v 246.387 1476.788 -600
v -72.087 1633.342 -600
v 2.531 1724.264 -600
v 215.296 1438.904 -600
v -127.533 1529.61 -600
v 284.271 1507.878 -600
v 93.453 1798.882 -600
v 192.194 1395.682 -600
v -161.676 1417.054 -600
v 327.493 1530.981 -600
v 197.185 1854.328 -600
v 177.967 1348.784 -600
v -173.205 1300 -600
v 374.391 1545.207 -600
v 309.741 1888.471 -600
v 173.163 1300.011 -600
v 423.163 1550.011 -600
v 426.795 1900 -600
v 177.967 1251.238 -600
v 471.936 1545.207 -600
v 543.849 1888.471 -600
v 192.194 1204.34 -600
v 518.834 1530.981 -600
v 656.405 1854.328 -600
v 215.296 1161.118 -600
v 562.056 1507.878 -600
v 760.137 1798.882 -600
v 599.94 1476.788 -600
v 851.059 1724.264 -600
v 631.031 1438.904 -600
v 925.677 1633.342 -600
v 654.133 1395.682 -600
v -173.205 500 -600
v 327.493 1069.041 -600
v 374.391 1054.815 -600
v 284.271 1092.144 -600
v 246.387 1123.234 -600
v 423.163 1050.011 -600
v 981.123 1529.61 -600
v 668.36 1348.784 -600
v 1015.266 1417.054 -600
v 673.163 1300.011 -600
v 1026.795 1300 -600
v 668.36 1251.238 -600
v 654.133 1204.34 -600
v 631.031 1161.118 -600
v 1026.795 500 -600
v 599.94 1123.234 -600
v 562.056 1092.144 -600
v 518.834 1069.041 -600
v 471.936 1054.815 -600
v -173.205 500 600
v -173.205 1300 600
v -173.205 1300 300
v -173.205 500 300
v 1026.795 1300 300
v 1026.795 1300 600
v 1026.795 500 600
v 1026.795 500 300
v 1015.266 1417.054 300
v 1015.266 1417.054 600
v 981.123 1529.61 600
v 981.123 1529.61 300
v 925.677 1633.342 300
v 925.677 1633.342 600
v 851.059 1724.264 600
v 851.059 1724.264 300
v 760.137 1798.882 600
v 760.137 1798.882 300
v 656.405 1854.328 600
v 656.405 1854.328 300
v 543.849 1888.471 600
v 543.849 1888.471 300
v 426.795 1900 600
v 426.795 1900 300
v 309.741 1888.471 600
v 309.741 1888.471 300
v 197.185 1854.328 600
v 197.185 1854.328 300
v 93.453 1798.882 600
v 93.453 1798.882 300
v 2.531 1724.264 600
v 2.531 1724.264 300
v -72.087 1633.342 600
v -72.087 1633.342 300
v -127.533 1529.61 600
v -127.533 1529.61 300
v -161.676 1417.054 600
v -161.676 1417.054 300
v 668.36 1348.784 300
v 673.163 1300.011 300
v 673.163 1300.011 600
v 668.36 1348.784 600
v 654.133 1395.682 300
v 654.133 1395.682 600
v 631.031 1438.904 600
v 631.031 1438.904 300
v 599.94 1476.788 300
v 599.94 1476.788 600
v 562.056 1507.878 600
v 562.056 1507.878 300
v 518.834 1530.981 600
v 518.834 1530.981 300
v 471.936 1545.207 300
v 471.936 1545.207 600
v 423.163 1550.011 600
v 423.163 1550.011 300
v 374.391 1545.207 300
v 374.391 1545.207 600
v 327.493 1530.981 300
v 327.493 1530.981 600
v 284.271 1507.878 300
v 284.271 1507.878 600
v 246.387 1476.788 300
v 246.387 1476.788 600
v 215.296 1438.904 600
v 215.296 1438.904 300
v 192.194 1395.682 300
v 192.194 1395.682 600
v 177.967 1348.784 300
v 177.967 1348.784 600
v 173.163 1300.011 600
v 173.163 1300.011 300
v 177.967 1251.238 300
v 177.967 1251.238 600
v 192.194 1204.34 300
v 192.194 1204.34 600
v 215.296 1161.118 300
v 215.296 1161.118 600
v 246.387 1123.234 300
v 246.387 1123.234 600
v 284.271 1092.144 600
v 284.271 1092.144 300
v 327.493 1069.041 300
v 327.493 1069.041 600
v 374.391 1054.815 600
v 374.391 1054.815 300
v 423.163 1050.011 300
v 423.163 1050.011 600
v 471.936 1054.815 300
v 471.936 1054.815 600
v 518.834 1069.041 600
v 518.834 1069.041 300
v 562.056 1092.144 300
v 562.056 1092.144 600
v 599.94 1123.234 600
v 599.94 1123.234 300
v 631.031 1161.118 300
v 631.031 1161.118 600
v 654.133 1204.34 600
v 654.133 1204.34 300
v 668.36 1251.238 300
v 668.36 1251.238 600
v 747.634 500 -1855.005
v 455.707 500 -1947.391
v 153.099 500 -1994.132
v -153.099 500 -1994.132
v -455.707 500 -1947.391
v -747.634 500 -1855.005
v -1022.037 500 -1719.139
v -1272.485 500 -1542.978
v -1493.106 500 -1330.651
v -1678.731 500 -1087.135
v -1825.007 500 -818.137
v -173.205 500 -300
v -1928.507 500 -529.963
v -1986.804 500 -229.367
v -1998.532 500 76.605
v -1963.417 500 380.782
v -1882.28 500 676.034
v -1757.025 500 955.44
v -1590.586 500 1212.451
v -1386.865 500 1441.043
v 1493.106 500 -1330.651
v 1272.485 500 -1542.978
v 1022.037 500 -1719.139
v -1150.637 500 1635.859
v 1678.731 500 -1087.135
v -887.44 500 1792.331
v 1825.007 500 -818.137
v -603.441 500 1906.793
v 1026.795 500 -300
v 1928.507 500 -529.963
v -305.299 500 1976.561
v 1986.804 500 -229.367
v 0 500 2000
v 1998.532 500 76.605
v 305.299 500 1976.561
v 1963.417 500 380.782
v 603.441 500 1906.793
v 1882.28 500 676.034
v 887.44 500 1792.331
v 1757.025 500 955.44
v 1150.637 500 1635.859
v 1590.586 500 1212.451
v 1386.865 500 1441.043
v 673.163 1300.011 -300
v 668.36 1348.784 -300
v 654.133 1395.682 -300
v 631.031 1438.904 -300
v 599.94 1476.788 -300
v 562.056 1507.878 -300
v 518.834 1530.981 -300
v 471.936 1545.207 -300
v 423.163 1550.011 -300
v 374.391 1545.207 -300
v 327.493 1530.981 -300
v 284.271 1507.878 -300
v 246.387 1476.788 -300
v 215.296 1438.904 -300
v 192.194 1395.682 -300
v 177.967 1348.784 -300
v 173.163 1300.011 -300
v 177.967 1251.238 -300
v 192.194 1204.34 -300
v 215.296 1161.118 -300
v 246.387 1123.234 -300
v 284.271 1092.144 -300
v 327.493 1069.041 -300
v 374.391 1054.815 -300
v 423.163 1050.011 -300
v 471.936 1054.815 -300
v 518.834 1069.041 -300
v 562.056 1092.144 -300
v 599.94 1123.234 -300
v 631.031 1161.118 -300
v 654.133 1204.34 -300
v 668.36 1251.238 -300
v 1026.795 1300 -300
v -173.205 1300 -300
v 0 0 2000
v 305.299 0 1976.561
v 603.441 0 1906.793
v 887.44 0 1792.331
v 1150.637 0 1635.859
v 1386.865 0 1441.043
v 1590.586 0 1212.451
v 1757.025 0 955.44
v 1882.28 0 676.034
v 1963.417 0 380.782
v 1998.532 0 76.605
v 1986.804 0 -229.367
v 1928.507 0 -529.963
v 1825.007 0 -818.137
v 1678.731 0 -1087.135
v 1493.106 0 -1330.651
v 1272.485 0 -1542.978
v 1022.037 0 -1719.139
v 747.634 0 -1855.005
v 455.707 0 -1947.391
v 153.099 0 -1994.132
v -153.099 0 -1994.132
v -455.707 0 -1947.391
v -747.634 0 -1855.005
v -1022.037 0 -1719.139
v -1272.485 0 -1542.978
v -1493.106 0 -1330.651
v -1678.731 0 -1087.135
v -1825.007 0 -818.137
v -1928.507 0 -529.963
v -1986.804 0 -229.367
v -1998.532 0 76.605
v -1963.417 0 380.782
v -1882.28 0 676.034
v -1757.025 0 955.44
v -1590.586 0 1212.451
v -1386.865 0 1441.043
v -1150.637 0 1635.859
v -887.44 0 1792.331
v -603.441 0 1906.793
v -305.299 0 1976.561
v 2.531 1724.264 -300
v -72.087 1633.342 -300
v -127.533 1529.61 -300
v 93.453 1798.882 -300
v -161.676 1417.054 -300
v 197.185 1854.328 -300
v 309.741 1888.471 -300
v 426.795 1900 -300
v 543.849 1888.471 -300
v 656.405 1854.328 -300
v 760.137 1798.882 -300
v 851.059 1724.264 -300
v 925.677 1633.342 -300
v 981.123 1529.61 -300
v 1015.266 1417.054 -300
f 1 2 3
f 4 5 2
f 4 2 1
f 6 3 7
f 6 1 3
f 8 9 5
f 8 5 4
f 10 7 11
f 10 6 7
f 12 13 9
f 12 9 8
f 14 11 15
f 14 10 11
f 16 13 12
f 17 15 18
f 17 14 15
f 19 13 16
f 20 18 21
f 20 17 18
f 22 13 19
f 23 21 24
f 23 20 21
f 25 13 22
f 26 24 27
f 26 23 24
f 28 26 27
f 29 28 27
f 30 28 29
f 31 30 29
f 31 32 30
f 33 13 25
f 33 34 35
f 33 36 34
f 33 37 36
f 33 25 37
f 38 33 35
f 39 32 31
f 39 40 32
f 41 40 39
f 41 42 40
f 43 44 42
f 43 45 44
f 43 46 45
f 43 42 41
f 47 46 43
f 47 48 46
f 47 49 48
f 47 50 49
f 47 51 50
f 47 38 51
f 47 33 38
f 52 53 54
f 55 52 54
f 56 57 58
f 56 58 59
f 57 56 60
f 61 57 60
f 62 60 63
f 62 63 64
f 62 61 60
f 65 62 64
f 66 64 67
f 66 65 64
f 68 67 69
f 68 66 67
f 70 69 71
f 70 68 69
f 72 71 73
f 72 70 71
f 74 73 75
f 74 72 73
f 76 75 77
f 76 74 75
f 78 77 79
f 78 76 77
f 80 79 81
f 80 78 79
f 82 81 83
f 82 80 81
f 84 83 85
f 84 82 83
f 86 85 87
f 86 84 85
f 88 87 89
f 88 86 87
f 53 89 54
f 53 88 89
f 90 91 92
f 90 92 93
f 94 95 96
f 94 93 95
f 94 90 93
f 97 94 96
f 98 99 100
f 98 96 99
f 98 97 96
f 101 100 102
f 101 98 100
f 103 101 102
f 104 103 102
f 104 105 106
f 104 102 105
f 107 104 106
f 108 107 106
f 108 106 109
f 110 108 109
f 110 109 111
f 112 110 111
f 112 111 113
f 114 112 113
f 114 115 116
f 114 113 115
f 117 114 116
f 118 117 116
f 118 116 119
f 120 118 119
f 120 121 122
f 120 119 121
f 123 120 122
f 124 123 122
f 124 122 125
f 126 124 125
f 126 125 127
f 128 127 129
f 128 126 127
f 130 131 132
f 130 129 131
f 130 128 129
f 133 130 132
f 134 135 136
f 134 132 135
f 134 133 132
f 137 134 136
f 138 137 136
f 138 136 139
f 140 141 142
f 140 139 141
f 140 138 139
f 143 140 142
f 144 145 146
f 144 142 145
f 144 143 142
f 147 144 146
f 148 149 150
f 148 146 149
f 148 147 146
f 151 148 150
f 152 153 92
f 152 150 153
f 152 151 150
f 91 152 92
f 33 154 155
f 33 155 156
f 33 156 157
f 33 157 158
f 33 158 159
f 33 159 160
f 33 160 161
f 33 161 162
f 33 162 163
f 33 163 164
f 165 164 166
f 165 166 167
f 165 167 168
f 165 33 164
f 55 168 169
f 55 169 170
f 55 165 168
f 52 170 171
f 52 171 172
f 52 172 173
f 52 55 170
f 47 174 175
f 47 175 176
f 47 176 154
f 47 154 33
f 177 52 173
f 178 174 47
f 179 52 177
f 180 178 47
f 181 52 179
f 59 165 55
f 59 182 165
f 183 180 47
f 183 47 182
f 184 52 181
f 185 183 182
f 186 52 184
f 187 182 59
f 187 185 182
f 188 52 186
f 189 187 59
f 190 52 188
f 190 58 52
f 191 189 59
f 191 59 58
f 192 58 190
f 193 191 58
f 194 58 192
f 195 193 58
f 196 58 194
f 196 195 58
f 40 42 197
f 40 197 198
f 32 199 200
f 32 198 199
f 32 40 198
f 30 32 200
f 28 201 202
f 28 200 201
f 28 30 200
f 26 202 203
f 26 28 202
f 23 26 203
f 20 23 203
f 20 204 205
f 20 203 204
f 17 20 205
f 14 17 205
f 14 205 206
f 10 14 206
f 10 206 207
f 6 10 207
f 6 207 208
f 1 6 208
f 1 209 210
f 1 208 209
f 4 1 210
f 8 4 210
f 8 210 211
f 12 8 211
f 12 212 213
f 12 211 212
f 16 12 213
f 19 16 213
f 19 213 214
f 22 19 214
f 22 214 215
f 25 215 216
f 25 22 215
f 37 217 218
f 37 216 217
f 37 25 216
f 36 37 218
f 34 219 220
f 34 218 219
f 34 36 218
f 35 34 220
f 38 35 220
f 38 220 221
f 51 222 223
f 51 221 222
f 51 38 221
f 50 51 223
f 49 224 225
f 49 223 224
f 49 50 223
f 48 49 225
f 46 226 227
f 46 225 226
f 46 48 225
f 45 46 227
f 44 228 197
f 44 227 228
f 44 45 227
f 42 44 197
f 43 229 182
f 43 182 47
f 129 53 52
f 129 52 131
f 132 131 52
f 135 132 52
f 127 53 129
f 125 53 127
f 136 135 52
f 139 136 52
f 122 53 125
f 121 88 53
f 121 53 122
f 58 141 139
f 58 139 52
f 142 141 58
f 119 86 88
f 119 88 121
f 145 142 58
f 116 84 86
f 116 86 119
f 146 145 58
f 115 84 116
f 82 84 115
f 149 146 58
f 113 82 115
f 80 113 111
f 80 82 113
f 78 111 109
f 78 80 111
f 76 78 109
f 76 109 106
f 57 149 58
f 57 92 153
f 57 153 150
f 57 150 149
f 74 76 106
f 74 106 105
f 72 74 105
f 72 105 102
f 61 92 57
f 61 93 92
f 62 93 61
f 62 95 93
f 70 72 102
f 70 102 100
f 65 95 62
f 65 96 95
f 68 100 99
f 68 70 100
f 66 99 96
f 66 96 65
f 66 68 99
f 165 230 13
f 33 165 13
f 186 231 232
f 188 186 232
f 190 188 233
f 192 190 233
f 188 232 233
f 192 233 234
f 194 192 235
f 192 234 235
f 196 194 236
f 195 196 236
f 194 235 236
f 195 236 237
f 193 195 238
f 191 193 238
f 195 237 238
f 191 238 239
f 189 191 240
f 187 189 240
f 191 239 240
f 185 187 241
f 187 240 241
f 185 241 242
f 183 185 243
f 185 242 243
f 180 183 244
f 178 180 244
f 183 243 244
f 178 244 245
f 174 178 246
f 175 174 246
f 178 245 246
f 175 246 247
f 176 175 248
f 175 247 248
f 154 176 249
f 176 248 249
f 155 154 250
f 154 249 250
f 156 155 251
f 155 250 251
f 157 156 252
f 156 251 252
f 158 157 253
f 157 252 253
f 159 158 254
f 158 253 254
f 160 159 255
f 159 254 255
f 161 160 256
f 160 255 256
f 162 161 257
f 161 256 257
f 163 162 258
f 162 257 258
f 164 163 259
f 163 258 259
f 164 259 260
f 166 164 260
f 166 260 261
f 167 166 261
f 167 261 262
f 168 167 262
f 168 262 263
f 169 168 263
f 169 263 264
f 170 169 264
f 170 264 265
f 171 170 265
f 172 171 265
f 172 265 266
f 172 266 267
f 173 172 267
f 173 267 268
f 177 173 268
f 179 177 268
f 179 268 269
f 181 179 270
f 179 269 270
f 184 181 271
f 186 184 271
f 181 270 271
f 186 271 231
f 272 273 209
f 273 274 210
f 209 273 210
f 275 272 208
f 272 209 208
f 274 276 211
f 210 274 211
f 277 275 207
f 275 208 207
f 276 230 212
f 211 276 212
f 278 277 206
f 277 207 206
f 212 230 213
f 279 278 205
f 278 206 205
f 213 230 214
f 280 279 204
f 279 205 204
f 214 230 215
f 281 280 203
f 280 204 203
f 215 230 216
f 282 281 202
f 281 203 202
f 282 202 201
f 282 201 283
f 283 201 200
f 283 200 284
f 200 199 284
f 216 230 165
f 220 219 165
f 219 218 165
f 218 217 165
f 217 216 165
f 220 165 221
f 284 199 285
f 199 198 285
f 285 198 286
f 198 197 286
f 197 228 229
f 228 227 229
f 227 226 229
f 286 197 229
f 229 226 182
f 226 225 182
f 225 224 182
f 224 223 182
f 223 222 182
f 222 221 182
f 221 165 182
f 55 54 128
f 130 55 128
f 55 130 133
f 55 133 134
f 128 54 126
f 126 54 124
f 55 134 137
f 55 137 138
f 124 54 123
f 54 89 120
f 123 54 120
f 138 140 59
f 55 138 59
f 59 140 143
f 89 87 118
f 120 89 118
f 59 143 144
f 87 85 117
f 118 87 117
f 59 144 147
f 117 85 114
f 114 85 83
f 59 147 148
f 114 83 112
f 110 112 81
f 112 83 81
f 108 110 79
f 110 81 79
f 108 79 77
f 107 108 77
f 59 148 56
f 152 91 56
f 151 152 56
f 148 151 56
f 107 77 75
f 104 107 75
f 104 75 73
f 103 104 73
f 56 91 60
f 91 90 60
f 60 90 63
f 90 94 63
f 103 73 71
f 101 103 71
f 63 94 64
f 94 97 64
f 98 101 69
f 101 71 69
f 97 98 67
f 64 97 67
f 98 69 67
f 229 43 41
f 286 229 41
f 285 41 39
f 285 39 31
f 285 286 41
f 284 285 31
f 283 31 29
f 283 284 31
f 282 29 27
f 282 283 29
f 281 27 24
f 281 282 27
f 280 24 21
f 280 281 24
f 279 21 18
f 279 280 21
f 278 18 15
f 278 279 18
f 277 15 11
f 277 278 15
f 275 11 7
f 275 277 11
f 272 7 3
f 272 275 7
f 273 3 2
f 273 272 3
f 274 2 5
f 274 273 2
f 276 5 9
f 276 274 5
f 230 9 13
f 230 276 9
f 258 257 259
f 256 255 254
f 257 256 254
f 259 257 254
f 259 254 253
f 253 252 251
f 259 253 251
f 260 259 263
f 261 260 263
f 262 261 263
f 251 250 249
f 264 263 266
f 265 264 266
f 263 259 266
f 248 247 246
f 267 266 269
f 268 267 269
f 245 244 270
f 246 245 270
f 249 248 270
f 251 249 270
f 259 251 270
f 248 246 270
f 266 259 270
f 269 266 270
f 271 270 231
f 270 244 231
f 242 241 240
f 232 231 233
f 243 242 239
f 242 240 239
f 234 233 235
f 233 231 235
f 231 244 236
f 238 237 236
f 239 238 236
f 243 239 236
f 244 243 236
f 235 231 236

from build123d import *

# Parameters (mm, degrees)
SKETCH3_R               = 2000
BOSS_EXTRUDE1_DEPTH     = 500
SKETCH4_W               = 1200
SKETCH4_H               = 300
BOSS_EXTRUDE2_DEPTH     = 800
BOSS_EXTRUDE3_DEPTH     = 300
SKETCH11_W              = 1200
SKETCH11_H              = 300
BOSS_EXTRUDE4_DEPTH     = 800
BOSS_EXTRUDE5_DEPTH     = 300
CUT_EXTRUDE1_DEPTH      = 3791.778284205
CUT_EXTRUDE1_DEPTH_BACK = 3791.778284205
SKETCH13_R              = 250


with BuildPart() as part:
    # Sketch3 → Boss-Extrude1 (new body)
    with BuildSketch(Plane(origin=(0, 0, 0), x_dir=(1, 0, 0), z_dir=(0, 1, 0))):
        with Locations(Location((0, 0, 0), (0, 0, 270))):
            Circle(SKETCH3_R)
    extrude(amount=BOSS_EXTRUDE1_DEPTH)

    # Sketch4 → Boss-Extrude2 (add)
    with BuildSketch(Plane(origin=(0, 500, 0), x_dir=(1, 0, 0), z_dir=(0, 1, 0))):
        with Locations((426.794885591, 450)):
            Rectangle(SKETCH4_W, SKETCH4_H)
    extrude(amount=BOSS_EXTRUDE2_DEPTH)

    # Sketch6 → Boss-Extrude3 (add)
    with BuildSketch(Plane.XY.offset(-300)):
        with BuildLine():
            Line((-173.205114409, 500), (1026.794885591, 500))
            Line((1026.794885591, 500), (1026.794885591, 1300))
            ThreePointArc((1026.794885591, 1300), (426.794885591, 1900), (-173.205114409, 1300))
            Line((-173.205114409, 1300), (-173.205114409, 500))
        make_face()
    extrude(amount=-BOSS_EXTRUDE3_DEPTH)

    # Sketch11 → Boss-Extrude4 (add)
    with BuildSketch(Plane(origin=(0, 500, 0), x_dir=(1, 0, 0), z_dir=(0, 1, 0))):
        with Locations((426.794885591, -450)):
            Rectangle(SKETCH11_W, SKETCH11_H)
    extrude(amount=BOSS_EXTRUDE4_DEPTH)

    # Sketch12 → Boss-Extrude5 (add)
    with BuildSketch(Plane.XY.offset(600)):
        with BuildLine():
            Line((-173.205114409, 1300), (1026.794885591, 1300))
            ThreePointArc((1026.794885591, 1300), (426.794885591, 1900), (-173.205114409, 1300))
        make_face()
    extrude(amount=-BOSS_EXTRUDE5_DEPTH)

    # Sketch13 → Cut-Extrude1 (cut, two sides: drawn at the far end of the back side and taken through both)
    with BuildSketch(Plane.XY.offset(600).offset(-CUT_EXTRUDE1_DEPTH_BACK)):
        with Locations((423.16346406, 1300.010989453)):
            Circle(SKETCH13_R)
    extrude(amount=CUT_EXTRUDE1_DEPTH + CUT_EXTRUDE1_DEPTH_BACK, mode=Mode.SUBTRACT)


solid = part.part
